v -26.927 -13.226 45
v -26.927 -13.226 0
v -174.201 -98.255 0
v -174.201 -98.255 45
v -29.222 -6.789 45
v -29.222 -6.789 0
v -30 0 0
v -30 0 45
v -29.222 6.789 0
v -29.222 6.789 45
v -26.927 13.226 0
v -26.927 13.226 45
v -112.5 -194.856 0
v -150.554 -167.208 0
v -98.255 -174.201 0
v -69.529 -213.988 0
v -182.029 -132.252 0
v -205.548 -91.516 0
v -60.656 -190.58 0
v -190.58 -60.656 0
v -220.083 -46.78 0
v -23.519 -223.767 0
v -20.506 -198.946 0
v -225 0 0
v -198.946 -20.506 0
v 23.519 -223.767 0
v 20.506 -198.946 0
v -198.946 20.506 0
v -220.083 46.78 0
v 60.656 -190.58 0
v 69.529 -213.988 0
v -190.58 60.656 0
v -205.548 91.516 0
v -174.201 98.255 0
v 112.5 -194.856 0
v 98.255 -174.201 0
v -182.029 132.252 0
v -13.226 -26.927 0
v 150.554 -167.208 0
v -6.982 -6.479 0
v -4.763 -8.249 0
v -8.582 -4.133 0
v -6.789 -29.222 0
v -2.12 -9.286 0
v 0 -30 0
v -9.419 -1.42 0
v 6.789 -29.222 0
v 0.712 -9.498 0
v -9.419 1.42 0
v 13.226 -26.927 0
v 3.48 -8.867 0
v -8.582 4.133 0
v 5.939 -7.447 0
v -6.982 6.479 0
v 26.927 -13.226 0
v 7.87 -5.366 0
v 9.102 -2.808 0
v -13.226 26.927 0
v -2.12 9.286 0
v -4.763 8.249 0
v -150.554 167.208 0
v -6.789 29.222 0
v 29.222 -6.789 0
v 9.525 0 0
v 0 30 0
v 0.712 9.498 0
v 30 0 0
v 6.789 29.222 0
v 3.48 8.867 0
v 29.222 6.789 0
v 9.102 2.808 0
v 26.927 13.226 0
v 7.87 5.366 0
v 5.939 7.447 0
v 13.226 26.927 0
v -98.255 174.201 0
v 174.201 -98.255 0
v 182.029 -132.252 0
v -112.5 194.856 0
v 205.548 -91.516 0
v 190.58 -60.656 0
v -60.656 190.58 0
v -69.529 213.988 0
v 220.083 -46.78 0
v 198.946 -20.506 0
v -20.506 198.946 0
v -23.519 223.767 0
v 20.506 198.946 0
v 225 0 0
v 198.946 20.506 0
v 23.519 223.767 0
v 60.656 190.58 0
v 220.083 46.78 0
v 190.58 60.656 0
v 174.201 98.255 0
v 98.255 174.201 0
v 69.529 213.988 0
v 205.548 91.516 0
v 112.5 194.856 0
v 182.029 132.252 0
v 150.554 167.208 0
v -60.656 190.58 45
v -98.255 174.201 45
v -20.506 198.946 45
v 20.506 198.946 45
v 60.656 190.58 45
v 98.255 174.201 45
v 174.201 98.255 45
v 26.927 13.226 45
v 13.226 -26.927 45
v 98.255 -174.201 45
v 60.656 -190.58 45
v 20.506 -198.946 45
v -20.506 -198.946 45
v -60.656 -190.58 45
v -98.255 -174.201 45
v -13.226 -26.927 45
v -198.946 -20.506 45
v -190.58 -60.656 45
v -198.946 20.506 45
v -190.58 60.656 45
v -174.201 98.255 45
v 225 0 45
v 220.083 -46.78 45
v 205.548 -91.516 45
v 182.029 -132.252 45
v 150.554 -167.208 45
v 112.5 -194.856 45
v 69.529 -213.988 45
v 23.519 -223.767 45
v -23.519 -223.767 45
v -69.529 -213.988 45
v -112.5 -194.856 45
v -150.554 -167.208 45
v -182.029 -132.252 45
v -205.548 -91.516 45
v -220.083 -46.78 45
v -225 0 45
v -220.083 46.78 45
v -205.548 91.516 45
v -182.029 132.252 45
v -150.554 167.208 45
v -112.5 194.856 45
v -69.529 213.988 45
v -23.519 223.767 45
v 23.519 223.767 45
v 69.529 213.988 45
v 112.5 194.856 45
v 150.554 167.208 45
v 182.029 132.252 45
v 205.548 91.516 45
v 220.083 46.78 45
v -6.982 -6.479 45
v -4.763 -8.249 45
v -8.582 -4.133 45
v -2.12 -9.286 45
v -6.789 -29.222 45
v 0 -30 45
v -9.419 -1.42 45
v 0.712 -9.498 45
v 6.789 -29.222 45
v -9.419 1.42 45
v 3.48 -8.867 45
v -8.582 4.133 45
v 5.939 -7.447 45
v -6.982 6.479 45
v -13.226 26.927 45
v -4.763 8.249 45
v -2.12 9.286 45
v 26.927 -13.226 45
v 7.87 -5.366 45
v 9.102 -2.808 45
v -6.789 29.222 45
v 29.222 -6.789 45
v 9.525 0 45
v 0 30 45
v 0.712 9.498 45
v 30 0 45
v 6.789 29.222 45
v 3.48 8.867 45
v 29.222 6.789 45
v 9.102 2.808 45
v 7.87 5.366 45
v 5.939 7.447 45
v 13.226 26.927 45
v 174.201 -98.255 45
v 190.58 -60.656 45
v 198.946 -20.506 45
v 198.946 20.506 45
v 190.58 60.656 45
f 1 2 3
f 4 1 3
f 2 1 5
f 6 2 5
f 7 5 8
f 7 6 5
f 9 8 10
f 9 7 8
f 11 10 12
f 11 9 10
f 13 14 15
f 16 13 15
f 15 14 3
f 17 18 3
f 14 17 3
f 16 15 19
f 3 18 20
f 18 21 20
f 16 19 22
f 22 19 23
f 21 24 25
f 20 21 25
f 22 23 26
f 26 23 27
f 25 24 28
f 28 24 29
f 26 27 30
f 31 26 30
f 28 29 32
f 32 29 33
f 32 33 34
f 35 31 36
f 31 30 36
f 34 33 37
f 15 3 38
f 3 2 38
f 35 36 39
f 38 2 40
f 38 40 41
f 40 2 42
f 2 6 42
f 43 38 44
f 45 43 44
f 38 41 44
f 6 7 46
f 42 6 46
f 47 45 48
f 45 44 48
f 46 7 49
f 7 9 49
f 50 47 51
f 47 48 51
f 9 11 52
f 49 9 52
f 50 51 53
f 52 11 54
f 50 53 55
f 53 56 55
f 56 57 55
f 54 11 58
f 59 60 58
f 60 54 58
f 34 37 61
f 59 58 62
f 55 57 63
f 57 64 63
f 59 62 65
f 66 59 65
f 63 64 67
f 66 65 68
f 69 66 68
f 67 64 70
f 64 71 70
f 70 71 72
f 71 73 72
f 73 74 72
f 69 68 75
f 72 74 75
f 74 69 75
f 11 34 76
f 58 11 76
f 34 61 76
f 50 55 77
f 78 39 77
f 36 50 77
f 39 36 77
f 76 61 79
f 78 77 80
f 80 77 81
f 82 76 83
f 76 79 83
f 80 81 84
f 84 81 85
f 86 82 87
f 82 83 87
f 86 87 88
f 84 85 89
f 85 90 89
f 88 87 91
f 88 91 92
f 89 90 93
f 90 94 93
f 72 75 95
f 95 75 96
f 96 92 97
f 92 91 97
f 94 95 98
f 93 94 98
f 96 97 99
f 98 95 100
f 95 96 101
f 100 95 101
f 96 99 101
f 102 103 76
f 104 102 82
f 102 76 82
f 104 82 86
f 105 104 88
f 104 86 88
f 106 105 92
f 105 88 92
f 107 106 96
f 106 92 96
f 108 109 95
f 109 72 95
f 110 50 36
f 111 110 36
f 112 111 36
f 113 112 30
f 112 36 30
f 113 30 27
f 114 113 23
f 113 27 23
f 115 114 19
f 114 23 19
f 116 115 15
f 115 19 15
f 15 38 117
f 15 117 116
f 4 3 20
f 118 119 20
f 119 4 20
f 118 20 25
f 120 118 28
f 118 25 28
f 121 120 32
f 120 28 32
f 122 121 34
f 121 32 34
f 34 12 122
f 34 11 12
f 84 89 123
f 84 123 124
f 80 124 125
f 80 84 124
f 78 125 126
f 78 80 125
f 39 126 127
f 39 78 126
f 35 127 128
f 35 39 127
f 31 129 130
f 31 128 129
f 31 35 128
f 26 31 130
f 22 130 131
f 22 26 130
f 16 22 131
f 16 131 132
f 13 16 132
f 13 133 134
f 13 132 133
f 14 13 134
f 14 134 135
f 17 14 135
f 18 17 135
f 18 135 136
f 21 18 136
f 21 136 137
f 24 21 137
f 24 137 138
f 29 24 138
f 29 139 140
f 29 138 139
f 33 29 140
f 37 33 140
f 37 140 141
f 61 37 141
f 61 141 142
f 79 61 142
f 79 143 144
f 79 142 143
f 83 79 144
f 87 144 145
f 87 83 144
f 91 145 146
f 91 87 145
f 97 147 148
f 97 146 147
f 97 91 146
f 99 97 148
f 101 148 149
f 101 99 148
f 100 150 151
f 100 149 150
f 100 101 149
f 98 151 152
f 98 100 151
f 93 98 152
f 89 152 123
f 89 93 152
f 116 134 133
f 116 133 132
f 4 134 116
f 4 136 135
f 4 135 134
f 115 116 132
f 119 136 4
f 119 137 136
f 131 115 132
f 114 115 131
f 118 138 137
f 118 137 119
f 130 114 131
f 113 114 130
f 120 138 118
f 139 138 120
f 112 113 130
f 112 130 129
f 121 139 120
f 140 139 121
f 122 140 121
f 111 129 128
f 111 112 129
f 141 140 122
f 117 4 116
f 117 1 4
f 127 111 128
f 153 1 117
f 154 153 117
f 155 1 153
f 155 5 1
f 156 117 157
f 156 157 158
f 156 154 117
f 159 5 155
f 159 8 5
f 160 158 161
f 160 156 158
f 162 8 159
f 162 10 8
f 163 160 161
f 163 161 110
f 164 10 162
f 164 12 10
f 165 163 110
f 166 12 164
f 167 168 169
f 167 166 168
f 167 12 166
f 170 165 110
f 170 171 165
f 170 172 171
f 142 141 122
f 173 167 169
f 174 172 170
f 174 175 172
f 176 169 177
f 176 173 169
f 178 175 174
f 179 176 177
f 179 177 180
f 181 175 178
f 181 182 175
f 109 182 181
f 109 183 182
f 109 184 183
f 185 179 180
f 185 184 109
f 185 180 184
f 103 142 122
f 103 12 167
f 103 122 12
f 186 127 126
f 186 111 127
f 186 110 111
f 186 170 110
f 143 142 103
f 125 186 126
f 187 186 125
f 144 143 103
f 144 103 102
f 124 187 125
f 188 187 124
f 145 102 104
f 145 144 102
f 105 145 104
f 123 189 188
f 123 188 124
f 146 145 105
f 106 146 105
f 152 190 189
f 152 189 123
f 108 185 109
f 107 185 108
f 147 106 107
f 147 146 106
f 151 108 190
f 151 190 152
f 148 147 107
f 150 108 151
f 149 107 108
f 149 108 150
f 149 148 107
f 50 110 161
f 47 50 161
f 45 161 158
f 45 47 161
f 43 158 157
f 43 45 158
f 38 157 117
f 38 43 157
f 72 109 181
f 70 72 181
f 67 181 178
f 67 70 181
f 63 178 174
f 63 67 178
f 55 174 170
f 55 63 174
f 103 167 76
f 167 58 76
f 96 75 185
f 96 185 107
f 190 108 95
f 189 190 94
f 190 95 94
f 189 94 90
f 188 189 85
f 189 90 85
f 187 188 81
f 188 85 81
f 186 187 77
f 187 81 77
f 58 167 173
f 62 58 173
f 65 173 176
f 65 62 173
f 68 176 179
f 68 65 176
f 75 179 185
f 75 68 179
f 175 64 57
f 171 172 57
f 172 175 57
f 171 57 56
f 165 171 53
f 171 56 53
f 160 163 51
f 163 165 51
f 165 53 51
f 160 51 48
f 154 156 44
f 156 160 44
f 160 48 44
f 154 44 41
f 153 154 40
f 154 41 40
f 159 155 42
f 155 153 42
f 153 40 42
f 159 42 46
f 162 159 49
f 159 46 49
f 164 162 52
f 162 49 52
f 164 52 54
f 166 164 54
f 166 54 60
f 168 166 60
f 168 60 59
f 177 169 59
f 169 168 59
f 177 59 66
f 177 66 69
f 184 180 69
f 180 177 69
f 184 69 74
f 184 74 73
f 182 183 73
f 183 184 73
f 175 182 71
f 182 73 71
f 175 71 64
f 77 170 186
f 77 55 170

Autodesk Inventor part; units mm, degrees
ref_plane "YZ Plane" through (0, 0, 0) normal (1, 0, 0) x (0, 1, 0)
ref_plane "XZ Plane" through (0, 0, 0) normal (0, 1, 0) x (-1, 0, 0)
ref_plane "XY Plane" through (0, 0, 0) normal (0, 0, 1) x (1, 0, 0)
sketch "Boceto1" plane through (0, 0, 0) normal (0, 0, 1) x (1, 0, 0)
  circle A0 centre (0, 0) radius 9.525
  circle A1 centre (0, 0) radius 225
  arc A2 (26.9272, -13.2259) -> (26.9272, 13.2259) centre (0, 0) ccw
  arc A3 (174.2011, -98.2546) -> (174.2011, 98.2546) centre (0, 0) ccw
  line L0 (26.9272, 13.2259) -> (174.2011, 98.2546)
  line L1 (26.9272, -13.2259) -> (174.2011, -98.2546)
  line L2 (13.2259, -26.9272) -> (98.2546, -174.2011)
  arc A4 (-98.2546, -174.2011) -> (98.2546, -174.2011) centre (0, 0) ccw
  line L3 (-13.2259, -26.9272) -> (-98.2546, -174.2011)
  arc A5 (-13.2259, -26.9272) -> (13.2259, -26.9272) centre (0, 0) ccw
  line L4 (-26.9272, -13.2259) -> (-174.2011, -98.2546)
  arc A6 (-174.2011, 98.2546) -> (-174.2011, -98.2546) centre (0, 0) ccw
  line L5 (-26.9272, 13.2259) -> (-174.2011, 98.2546)
  arc A7 (-26.9272, 13.2259) -> (-26.9272, -13.2259) centre (0, 0) ccw
  line L6 (-13.2259, 26.9272) -> (-98.2546, 174.2011)
  arc A8 (98.2546, 174.2011) -> (-98.2546, 174.2011) centre (0, 0) ccw
  line L7 (13.2259, 26.9272) -> (98.2546, 174.2011)
  arc A9 (13.2259, 26.9272) -> (-13.2259, 26.9272) centre (0, 0) ccw
  dimension "d2" = 450
  dimension "d3" = 60
  dimension "d4" = 400
  dimension "d11" = 360
extrude "Extrusión1" add sketch "Boceto1" along normal blind 45
